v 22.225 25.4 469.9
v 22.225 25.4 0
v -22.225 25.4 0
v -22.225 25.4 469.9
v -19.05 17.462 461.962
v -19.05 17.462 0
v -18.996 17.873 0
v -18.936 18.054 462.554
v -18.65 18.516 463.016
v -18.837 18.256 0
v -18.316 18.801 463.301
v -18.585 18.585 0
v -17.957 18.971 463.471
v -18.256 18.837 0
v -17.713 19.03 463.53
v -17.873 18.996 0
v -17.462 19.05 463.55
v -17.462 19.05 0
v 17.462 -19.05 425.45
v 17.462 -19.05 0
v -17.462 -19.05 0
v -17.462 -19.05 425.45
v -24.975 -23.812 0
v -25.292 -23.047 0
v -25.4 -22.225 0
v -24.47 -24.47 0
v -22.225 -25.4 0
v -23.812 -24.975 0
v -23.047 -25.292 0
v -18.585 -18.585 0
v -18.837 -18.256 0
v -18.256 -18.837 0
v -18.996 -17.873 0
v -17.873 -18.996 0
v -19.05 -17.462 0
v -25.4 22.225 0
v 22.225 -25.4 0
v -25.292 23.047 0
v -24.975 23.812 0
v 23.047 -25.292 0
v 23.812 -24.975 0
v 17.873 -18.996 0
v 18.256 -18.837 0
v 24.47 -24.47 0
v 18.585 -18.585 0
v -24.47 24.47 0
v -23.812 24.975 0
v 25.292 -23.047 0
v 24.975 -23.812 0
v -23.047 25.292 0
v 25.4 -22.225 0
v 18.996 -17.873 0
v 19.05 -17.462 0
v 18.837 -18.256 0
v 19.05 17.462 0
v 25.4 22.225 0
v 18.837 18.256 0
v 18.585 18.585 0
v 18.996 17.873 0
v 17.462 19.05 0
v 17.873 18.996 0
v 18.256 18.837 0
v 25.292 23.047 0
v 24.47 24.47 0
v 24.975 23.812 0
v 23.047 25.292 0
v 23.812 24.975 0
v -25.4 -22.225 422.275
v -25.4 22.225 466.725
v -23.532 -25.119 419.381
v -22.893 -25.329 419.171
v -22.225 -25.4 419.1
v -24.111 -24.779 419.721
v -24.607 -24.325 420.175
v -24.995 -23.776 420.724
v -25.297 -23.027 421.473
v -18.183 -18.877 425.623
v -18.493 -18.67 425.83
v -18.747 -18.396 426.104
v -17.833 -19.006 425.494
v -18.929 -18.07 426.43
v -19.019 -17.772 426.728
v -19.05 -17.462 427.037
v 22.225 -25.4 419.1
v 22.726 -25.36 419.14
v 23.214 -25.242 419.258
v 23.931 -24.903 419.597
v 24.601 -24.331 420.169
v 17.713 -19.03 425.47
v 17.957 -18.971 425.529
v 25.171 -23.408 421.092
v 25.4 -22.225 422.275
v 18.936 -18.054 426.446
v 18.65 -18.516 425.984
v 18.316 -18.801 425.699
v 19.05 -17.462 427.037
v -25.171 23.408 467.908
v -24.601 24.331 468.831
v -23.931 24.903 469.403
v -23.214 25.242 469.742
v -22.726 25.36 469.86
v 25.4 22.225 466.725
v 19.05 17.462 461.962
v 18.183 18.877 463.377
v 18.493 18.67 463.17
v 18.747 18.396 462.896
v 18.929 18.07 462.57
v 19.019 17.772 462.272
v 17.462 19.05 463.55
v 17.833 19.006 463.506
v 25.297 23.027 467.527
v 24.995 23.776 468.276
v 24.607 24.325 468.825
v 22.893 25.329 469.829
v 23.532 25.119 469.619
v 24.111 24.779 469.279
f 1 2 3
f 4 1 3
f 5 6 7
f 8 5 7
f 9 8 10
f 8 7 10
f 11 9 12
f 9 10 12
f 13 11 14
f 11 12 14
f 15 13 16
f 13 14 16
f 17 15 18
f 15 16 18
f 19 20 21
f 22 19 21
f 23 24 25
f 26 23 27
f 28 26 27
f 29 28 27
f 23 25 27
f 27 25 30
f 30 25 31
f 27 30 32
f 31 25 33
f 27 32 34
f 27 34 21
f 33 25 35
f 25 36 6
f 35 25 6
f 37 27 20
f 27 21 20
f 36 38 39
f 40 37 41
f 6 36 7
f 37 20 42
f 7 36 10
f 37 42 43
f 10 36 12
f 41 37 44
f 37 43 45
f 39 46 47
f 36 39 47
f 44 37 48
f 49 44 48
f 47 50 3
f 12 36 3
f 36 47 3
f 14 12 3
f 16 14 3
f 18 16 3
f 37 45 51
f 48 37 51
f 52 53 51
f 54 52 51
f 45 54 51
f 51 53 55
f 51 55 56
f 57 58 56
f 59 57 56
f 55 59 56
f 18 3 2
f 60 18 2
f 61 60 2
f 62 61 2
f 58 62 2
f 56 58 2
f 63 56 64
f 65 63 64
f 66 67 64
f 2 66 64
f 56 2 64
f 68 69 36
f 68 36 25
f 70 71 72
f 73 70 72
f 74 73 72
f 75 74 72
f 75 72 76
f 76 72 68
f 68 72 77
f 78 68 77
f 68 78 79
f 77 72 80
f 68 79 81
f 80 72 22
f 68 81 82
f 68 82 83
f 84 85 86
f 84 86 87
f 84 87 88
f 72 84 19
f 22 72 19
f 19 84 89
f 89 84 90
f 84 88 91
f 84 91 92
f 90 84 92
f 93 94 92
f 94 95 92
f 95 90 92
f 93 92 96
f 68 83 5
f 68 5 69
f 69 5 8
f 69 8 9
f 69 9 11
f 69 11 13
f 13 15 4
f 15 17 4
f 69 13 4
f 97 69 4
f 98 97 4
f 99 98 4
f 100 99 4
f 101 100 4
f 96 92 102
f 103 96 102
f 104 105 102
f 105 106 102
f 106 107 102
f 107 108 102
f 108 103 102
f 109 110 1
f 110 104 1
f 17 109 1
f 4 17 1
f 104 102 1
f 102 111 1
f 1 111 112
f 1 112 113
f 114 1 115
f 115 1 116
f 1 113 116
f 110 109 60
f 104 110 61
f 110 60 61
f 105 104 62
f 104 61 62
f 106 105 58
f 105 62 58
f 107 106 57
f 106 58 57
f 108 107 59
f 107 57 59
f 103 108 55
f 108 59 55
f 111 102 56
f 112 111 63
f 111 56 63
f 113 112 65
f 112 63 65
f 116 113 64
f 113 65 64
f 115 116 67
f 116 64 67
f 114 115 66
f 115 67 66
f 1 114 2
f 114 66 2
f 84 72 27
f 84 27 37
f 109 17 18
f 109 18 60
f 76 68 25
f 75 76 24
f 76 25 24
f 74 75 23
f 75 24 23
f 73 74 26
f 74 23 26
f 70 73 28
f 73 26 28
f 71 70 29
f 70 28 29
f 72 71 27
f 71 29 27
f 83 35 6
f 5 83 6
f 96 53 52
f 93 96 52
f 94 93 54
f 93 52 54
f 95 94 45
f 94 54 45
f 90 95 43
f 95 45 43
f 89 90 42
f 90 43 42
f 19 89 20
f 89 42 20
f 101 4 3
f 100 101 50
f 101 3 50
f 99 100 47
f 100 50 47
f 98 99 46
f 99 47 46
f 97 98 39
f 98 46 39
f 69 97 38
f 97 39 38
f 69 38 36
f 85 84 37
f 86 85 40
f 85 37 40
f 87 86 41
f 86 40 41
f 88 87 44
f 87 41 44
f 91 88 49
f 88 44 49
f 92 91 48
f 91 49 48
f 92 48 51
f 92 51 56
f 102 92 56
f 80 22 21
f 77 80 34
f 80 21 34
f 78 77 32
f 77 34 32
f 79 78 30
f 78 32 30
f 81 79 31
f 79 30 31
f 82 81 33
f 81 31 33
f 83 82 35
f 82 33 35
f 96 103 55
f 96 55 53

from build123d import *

# Parameters (mm, degrees)
F1_DEPTH = 469.9
F3_DEPTH = 50.801


with BuildPart() as f1:
    # F0 (on Top) → F1 (new body)
    with BuildSketch(Plane.XY):
        with BuildLine():
            Line((22.225, 25.4), (-22.225, 25.4))
            ThreePointArc((-22.225, 25.4), (-24.470064, 24.470064), (-25.4, 22.225))
            Line((-25.4, 22.225), (-25.4, -22.225))
            ThreePointArc((-25.4, -22.225), (-24.470064, -24.470064), (-22.225, -25.4))
            Line((-22.225, -25.4), (22.225, -25.4))
            ThreePointArc((22.225, -25.4), (24.470064, -24.470064), (25.4, -22.225))
            Line((25.4, -22.225), (25.4, 22.225))
            ThreePointArc((25.4, 22.225), (24.470064, 24.470064), (22.225, 25.4))
        make_face()
        with BuildLine():
            ThreePointArc((-19.05, 17.4625), (-18.585032, 18.585032), (-17.4625, 19.05))
            Line((-17.4625, 19.05), (17.4625, 19.05))
            ThreePointArc((17.4625, 19.05), (18.585032, 18.585032), (19.05, 17.4625))
            Line((19.05, 17.4625), (19.05, -17.4625))
            ThreePointArc((19.05, -17.4625), (18.585032, -18.585032), (17.4625, -19.05))
            Line((17.4625, -19.05), (-17.4625, -19.05))
            ThreePointArc((-17.4625, -19.05), (-18.585032, -18.585032), (-19.05, -17.4625))
            Line((-19.05, -17.4625), (-19.05, 17.4625))
        make_face(mode=Mode.SUBTRACT)
    extrude(amount=F1_DEPTH)

    # F2 (on face) → F3 (cut, through all)
    with BuildSketch(Plane.YZ.offset(25.4)):
        Polygon((-25.4, 419.1), (25.4, 469.9), (-25.4, 469.9), align=None)
    extrude(amount=-F3_DEPTH, mode=Mode.SUBTRACT)


solid = f1.part
